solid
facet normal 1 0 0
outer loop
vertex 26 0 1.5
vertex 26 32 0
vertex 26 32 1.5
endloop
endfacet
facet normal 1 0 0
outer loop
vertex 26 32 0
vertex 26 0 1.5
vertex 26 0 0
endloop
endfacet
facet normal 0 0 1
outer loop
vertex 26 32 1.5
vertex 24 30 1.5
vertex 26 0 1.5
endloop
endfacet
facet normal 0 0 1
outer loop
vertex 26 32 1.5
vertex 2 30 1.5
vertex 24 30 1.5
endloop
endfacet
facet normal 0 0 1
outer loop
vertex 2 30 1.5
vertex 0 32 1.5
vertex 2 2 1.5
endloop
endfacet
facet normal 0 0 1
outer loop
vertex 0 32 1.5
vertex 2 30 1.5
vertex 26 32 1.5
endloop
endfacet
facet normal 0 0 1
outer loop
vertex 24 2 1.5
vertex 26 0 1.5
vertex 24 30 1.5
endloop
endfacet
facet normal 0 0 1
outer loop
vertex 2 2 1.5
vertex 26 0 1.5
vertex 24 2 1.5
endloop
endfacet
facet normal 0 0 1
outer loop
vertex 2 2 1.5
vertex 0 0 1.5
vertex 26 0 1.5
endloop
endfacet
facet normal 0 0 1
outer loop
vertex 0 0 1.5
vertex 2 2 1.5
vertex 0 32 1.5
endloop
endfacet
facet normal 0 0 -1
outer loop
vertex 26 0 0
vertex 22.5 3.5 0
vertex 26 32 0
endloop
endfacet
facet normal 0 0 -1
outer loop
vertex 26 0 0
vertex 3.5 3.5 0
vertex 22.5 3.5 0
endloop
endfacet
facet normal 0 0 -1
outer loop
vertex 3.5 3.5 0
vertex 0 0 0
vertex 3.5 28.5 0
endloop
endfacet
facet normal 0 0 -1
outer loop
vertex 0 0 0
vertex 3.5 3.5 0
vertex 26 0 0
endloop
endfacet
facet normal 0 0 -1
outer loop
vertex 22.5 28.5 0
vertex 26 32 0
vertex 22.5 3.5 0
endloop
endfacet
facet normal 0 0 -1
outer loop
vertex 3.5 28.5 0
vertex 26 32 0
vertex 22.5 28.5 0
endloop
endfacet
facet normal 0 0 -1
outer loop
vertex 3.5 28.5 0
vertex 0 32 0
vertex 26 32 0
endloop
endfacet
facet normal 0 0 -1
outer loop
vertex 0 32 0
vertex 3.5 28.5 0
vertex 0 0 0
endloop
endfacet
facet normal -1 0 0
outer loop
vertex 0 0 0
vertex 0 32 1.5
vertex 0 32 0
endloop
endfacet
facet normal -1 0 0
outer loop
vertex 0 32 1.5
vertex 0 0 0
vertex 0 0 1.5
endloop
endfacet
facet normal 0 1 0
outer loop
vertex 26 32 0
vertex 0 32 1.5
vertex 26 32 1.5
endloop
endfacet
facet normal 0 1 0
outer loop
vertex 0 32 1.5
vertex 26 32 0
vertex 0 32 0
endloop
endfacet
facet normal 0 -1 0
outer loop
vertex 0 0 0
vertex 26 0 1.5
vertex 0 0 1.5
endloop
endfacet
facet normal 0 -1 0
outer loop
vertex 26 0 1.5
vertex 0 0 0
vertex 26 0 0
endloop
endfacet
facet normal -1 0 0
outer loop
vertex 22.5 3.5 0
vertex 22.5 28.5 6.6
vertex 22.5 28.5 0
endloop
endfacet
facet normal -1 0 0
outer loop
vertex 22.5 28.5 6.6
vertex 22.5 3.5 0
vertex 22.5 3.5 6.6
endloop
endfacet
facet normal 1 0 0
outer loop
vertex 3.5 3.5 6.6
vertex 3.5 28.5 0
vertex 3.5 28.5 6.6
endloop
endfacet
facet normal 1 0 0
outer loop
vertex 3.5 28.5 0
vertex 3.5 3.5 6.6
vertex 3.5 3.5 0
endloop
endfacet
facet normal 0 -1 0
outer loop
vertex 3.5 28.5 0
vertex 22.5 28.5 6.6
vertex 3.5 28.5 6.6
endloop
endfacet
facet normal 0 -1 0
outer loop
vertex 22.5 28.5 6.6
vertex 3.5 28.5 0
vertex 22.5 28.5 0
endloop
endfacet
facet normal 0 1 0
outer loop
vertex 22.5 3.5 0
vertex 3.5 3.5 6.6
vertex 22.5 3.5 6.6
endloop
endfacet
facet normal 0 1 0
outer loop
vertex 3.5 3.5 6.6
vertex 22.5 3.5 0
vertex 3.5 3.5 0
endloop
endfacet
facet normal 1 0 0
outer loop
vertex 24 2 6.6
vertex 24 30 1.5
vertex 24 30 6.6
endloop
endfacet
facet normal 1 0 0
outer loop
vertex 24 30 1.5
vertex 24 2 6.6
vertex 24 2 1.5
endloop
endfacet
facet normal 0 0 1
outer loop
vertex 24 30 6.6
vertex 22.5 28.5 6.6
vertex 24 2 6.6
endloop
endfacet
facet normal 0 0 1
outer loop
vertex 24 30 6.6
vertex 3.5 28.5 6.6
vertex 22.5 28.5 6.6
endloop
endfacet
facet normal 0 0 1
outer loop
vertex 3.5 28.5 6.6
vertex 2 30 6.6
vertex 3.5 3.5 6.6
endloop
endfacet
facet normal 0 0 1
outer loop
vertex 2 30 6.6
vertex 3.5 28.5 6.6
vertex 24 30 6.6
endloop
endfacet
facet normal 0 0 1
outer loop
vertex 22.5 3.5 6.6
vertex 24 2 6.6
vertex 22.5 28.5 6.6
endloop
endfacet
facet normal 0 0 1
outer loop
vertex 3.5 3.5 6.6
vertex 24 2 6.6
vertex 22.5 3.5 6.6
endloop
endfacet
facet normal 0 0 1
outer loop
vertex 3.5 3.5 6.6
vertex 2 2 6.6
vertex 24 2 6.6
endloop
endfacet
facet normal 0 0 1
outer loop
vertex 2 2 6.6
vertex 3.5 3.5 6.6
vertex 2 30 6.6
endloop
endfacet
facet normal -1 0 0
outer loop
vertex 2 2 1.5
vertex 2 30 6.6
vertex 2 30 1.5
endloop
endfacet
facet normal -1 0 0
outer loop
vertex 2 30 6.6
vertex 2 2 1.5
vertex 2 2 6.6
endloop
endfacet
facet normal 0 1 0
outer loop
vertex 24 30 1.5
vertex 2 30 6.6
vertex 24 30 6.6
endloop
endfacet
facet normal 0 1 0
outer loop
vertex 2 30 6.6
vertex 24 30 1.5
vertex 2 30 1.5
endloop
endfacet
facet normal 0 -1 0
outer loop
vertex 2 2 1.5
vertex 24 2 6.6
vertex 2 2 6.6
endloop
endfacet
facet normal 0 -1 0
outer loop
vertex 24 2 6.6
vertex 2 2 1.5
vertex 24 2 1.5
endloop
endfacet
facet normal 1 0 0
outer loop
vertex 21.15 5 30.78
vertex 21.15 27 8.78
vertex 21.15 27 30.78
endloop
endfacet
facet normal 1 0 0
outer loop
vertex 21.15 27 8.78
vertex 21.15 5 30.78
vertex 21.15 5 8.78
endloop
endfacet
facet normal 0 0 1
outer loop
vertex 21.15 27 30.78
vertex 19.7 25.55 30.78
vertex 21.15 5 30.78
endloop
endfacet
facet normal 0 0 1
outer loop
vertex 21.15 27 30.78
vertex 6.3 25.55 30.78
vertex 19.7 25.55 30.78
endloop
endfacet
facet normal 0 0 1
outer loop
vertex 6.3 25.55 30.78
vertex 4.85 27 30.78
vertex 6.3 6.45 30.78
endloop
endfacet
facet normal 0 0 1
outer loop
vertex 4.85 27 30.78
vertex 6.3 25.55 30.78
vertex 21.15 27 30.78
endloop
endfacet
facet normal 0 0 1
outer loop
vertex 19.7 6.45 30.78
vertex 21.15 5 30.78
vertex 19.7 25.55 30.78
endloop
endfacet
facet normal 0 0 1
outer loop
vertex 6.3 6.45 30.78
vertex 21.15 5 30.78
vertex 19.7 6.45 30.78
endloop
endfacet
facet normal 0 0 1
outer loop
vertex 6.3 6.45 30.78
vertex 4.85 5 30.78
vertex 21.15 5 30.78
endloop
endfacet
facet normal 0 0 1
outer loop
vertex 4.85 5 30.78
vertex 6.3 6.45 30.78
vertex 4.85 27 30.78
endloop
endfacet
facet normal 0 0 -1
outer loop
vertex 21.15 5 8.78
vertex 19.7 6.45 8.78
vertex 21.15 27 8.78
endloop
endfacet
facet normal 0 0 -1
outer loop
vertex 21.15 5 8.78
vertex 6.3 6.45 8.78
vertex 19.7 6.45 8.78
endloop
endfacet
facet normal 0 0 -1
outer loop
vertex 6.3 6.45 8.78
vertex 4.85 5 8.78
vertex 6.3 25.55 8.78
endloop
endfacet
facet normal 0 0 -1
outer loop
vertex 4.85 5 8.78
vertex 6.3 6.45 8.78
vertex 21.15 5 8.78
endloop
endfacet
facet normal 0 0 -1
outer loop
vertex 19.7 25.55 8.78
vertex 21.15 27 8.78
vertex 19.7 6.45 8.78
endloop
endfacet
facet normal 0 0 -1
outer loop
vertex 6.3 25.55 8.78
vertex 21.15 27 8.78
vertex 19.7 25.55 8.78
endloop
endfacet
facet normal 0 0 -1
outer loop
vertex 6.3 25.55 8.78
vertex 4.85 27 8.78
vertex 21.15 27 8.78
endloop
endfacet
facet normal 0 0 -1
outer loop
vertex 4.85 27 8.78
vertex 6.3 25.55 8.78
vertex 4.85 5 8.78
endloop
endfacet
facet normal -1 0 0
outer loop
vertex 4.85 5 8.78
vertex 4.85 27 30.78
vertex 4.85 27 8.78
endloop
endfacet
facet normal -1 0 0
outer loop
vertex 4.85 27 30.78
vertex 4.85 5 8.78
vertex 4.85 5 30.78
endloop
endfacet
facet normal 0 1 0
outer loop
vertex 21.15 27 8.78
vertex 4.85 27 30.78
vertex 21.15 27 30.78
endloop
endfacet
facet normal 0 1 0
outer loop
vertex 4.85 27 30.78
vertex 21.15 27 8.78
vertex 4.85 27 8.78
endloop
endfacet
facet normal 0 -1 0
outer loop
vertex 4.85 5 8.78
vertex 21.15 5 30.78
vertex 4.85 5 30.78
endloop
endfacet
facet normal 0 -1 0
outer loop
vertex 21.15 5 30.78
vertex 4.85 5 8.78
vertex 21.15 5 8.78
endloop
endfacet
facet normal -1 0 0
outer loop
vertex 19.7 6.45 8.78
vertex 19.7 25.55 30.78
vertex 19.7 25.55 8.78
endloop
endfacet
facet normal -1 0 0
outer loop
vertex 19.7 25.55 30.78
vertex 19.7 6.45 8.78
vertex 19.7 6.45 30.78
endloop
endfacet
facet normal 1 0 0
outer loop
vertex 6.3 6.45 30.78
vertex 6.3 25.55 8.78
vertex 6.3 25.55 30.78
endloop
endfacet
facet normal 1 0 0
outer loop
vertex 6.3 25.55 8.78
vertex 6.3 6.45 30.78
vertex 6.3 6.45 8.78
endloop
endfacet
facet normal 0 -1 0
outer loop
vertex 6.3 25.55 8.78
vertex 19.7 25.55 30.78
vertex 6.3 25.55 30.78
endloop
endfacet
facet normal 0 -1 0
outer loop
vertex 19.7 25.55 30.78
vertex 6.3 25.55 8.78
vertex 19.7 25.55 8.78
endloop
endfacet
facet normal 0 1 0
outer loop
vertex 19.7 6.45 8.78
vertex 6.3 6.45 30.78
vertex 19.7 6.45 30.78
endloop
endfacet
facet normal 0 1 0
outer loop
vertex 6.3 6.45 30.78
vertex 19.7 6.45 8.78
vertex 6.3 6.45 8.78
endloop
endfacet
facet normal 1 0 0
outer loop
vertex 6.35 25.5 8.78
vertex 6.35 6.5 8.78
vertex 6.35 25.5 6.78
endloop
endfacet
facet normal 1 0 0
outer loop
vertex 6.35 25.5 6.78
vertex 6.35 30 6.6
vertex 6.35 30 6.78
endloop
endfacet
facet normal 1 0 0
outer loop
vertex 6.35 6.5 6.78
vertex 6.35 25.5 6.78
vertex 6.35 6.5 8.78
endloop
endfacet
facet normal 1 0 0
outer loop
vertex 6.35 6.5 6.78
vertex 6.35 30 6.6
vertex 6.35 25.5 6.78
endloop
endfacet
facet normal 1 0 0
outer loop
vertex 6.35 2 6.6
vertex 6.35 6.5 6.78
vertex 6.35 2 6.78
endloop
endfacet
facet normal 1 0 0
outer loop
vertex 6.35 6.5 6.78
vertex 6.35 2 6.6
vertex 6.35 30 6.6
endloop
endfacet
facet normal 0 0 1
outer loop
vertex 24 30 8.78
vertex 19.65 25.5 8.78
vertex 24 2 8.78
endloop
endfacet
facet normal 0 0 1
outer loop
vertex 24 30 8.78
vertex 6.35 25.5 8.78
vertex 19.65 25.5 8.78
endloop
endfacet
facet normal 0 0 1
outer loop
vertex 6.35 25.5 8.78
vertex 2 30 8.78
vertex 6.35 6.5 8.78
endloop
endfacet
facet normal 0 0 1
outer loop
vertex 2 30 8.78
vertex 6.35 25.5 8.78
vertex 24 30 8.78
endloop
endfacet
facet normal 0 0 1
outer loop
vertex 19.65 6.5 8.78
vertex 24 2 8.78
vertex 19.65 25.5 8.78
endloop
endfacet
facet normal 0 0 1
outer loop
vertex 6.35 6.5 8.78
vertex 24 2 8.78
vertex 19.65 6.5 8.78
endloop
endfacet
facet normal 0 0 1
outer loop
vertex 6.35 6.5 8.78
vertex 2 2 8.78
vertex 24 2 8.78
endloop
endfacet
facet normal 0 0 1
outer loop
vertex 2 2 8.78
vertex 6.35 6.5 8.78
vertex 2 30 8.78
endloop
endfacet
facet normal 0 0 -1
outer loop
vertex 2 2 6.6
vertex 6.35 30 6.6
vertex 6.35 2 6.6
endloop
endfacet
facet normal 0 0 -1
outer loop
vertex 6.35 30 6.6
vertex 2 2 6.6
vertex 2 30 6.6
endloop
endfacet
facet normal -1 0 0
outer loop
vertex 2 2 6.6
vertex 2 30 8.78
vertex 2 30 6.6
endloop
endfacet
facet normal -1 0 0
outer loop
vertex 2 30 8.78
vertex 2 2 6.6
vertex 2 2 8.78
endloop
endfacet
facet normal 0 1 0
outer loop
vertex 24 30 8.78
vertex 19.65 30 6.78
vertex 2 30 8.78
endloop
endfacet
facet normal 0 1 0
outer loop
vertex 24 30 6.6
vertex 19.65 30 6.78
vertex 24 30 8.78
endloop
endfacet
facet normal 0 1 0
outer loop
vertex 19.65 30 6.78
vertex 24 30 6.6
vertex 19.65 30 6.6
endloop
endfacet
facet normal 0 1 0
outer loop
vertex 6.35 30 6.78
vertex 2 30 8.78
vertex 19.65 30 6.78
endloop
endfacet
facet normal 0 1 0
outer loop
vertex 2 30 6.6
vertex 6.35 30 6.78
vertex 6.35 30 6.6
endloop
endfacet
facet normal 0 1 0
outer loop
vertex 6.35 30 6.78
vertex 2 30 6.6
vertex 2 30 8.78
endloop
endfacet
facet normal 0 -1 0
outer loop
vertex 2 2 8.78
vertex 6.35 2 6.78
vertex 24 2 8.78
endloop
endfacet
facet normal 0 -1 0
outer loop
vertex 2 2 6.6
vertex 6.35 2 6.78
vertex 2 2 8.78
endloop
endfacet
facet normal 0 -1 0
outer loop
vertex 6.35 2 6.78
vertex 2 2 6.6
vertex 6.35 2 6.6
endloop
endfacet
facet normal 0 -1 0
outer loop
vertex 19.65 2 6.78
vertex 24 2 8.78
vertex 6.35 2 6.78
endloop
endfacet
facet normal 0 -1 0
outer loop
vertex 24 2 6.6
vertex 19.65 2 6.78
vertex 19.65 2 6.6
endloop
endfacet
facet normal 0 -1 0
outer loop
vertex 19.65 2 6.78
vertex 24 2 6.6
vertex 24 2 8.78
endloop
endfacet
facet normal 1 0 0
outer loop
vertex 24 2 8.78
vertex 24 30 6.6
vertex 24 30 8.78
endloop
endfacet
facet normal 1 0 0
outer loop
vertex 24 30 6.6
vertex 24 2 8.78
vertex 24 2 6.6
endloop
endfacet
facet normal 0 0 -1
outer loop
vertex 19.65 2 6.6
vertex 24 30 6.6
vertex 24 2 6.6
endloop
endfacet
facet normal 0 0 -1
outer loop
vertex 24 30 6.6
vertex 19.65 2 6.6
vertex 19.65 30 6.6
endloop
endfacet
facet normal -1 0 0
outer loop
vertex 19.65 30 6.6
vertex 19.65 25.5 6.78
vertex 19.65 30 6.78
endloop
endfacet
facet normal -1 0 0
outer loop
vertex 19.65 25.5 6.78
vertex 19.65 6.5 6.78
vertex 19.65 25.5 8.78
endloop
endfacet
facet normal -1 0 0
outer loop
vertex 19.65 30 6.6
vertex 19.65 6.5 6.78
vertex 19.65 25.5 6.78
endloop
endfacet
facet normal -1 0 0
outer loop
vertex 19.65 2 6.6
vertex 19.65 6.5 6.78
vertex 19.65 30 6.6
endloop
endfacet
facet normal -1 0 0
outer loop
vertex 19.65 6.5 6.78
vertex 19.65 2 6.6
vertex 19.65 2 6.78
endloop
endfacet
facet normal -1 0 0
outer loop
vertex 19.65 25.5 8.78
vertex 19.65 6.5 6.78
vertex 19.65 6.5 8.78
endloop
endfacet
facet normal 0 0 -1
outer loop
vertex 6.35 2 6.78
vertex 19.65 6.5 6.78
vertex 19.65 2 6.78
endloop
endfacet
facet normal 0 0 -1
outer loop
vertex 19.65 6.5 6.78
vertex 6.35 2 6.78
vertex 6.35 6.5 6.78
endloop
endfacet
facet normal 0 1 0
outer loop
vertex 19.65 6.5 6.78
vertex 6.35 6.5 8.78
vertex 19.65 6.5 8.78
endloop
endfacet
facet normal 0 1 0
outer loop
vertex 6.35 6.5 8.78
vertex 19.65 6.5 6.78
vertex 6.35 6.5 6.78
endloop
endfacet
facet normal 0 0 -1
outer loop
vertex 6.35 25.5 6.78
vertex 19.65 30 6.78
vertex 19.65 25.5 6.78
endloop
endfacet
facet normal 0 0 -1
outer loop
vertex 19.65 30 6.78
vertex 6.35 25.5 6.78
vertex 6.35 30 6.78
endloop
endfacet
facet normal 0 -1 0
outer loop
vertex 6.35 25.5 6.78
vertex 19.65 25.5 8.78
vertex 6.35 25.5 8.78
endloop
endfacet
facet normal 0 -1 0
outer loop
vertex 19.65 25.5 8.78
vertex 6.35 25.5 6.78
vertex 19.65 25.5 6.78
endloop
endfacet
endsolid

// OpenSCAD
// Switch Socket for mounting the switch below the panel
// KBS3056 29.12.2018
switch_width            = 13.3;// without collet
switch_length           = 19;  // without collet
switch_deepth           = 24;  // without collet, with or without terminals
switch_bridge_width = 2;   // default 2

sunk_width              = 19;  // bigger than switch collet
sunk_length             = 25;  // bigger than switch collet
sunk_deepth             = 6.6;   // bigger than switch collet height + lever

collet_brim             = 2;   // default 2
collet_height           = 1.5; // default 1.5

wall_thickness          = 1.5; // default 1.5
///////////////////////////////////////////////////////////////////////////
switch_cover            = 1;// [0:1]



union(){
    //collet
    difference(){
        cube([sunk_width + 2 * wall_thickness + 2 * collet_brim, sunk_length + 2 * wall_thickness + 2 * collet_brim, collet_height]);
        translate([collet_brim + wall_thickness, collet_brim + wall_thickness, -0.1])
        cube([sunk_width, sunk_length, collet_height + 0.2]);
    }
    
    //sunk
    translate([collet_brim, collet_brim, collet_height]){
        difference(){
            cube([sunk_width + 2 * wall_thickness, sunk_length + 2 *    wall_thickness, sunk_deepth - collet_height]);
            translate([wall_thickness, wall_thickness, -0.1])
            cube([sunk_width, sunk_length, sunk_deepth - collet_height + 0.2]);
        }
    }
    
    //switch
    translate([collet_brim, collet_brim, sunk_deepth]){
        cube([(sunk_width - switch_width) / 2 + wall_thickness, sunk_length + 2 * wall_thickness, switch_bridge_width + 0.18]);
        translate([sunk_width - (sunk_width - switch_width) / 2 + wall_thickness, 0, 0])
        cube([(sunk_width - switch_width) / 2 + wall_thickness, sunk_length + 2 * wall_thickness, switch_bridge_width + 0.18]);
        
        translate([0, 0, 0.18])
        cube([sunk_width + 2 * wall_thickness, (sunk_length - switch_length) / 2 + wall_thickness, switch_bridge_width]); 
        translate([0, sunk_length - (sunk_length - switch_length) / 2 + wall_thickness, 0.18])
        cube([sunk_width + 2 * wall_thickness, (sunk_length - switch_length) / 2 + wall_thickness, switch_bridge_width]); 
        
        //switch cover
        if (switch_cover){
            translate([(sunk_width - switch_width) / 2, (sunk_length - switch_length) / 2, switch_bridge_width + 0.18]){
                difference(){
                    cube([switch_width + 2 * wall_thickness, switch_length + 2 * wall_thickness, switch_deepth - switch_bridge_width]);
                    translate([wall_thickness - 0.05, wall_thickness - 0.05, -0.1])
                    cube([switch_width + 0.1, switch_length + 0.1, switch_deepth - switch_bridge_width + 0.2]);
                }
            }
        }
    }
}
